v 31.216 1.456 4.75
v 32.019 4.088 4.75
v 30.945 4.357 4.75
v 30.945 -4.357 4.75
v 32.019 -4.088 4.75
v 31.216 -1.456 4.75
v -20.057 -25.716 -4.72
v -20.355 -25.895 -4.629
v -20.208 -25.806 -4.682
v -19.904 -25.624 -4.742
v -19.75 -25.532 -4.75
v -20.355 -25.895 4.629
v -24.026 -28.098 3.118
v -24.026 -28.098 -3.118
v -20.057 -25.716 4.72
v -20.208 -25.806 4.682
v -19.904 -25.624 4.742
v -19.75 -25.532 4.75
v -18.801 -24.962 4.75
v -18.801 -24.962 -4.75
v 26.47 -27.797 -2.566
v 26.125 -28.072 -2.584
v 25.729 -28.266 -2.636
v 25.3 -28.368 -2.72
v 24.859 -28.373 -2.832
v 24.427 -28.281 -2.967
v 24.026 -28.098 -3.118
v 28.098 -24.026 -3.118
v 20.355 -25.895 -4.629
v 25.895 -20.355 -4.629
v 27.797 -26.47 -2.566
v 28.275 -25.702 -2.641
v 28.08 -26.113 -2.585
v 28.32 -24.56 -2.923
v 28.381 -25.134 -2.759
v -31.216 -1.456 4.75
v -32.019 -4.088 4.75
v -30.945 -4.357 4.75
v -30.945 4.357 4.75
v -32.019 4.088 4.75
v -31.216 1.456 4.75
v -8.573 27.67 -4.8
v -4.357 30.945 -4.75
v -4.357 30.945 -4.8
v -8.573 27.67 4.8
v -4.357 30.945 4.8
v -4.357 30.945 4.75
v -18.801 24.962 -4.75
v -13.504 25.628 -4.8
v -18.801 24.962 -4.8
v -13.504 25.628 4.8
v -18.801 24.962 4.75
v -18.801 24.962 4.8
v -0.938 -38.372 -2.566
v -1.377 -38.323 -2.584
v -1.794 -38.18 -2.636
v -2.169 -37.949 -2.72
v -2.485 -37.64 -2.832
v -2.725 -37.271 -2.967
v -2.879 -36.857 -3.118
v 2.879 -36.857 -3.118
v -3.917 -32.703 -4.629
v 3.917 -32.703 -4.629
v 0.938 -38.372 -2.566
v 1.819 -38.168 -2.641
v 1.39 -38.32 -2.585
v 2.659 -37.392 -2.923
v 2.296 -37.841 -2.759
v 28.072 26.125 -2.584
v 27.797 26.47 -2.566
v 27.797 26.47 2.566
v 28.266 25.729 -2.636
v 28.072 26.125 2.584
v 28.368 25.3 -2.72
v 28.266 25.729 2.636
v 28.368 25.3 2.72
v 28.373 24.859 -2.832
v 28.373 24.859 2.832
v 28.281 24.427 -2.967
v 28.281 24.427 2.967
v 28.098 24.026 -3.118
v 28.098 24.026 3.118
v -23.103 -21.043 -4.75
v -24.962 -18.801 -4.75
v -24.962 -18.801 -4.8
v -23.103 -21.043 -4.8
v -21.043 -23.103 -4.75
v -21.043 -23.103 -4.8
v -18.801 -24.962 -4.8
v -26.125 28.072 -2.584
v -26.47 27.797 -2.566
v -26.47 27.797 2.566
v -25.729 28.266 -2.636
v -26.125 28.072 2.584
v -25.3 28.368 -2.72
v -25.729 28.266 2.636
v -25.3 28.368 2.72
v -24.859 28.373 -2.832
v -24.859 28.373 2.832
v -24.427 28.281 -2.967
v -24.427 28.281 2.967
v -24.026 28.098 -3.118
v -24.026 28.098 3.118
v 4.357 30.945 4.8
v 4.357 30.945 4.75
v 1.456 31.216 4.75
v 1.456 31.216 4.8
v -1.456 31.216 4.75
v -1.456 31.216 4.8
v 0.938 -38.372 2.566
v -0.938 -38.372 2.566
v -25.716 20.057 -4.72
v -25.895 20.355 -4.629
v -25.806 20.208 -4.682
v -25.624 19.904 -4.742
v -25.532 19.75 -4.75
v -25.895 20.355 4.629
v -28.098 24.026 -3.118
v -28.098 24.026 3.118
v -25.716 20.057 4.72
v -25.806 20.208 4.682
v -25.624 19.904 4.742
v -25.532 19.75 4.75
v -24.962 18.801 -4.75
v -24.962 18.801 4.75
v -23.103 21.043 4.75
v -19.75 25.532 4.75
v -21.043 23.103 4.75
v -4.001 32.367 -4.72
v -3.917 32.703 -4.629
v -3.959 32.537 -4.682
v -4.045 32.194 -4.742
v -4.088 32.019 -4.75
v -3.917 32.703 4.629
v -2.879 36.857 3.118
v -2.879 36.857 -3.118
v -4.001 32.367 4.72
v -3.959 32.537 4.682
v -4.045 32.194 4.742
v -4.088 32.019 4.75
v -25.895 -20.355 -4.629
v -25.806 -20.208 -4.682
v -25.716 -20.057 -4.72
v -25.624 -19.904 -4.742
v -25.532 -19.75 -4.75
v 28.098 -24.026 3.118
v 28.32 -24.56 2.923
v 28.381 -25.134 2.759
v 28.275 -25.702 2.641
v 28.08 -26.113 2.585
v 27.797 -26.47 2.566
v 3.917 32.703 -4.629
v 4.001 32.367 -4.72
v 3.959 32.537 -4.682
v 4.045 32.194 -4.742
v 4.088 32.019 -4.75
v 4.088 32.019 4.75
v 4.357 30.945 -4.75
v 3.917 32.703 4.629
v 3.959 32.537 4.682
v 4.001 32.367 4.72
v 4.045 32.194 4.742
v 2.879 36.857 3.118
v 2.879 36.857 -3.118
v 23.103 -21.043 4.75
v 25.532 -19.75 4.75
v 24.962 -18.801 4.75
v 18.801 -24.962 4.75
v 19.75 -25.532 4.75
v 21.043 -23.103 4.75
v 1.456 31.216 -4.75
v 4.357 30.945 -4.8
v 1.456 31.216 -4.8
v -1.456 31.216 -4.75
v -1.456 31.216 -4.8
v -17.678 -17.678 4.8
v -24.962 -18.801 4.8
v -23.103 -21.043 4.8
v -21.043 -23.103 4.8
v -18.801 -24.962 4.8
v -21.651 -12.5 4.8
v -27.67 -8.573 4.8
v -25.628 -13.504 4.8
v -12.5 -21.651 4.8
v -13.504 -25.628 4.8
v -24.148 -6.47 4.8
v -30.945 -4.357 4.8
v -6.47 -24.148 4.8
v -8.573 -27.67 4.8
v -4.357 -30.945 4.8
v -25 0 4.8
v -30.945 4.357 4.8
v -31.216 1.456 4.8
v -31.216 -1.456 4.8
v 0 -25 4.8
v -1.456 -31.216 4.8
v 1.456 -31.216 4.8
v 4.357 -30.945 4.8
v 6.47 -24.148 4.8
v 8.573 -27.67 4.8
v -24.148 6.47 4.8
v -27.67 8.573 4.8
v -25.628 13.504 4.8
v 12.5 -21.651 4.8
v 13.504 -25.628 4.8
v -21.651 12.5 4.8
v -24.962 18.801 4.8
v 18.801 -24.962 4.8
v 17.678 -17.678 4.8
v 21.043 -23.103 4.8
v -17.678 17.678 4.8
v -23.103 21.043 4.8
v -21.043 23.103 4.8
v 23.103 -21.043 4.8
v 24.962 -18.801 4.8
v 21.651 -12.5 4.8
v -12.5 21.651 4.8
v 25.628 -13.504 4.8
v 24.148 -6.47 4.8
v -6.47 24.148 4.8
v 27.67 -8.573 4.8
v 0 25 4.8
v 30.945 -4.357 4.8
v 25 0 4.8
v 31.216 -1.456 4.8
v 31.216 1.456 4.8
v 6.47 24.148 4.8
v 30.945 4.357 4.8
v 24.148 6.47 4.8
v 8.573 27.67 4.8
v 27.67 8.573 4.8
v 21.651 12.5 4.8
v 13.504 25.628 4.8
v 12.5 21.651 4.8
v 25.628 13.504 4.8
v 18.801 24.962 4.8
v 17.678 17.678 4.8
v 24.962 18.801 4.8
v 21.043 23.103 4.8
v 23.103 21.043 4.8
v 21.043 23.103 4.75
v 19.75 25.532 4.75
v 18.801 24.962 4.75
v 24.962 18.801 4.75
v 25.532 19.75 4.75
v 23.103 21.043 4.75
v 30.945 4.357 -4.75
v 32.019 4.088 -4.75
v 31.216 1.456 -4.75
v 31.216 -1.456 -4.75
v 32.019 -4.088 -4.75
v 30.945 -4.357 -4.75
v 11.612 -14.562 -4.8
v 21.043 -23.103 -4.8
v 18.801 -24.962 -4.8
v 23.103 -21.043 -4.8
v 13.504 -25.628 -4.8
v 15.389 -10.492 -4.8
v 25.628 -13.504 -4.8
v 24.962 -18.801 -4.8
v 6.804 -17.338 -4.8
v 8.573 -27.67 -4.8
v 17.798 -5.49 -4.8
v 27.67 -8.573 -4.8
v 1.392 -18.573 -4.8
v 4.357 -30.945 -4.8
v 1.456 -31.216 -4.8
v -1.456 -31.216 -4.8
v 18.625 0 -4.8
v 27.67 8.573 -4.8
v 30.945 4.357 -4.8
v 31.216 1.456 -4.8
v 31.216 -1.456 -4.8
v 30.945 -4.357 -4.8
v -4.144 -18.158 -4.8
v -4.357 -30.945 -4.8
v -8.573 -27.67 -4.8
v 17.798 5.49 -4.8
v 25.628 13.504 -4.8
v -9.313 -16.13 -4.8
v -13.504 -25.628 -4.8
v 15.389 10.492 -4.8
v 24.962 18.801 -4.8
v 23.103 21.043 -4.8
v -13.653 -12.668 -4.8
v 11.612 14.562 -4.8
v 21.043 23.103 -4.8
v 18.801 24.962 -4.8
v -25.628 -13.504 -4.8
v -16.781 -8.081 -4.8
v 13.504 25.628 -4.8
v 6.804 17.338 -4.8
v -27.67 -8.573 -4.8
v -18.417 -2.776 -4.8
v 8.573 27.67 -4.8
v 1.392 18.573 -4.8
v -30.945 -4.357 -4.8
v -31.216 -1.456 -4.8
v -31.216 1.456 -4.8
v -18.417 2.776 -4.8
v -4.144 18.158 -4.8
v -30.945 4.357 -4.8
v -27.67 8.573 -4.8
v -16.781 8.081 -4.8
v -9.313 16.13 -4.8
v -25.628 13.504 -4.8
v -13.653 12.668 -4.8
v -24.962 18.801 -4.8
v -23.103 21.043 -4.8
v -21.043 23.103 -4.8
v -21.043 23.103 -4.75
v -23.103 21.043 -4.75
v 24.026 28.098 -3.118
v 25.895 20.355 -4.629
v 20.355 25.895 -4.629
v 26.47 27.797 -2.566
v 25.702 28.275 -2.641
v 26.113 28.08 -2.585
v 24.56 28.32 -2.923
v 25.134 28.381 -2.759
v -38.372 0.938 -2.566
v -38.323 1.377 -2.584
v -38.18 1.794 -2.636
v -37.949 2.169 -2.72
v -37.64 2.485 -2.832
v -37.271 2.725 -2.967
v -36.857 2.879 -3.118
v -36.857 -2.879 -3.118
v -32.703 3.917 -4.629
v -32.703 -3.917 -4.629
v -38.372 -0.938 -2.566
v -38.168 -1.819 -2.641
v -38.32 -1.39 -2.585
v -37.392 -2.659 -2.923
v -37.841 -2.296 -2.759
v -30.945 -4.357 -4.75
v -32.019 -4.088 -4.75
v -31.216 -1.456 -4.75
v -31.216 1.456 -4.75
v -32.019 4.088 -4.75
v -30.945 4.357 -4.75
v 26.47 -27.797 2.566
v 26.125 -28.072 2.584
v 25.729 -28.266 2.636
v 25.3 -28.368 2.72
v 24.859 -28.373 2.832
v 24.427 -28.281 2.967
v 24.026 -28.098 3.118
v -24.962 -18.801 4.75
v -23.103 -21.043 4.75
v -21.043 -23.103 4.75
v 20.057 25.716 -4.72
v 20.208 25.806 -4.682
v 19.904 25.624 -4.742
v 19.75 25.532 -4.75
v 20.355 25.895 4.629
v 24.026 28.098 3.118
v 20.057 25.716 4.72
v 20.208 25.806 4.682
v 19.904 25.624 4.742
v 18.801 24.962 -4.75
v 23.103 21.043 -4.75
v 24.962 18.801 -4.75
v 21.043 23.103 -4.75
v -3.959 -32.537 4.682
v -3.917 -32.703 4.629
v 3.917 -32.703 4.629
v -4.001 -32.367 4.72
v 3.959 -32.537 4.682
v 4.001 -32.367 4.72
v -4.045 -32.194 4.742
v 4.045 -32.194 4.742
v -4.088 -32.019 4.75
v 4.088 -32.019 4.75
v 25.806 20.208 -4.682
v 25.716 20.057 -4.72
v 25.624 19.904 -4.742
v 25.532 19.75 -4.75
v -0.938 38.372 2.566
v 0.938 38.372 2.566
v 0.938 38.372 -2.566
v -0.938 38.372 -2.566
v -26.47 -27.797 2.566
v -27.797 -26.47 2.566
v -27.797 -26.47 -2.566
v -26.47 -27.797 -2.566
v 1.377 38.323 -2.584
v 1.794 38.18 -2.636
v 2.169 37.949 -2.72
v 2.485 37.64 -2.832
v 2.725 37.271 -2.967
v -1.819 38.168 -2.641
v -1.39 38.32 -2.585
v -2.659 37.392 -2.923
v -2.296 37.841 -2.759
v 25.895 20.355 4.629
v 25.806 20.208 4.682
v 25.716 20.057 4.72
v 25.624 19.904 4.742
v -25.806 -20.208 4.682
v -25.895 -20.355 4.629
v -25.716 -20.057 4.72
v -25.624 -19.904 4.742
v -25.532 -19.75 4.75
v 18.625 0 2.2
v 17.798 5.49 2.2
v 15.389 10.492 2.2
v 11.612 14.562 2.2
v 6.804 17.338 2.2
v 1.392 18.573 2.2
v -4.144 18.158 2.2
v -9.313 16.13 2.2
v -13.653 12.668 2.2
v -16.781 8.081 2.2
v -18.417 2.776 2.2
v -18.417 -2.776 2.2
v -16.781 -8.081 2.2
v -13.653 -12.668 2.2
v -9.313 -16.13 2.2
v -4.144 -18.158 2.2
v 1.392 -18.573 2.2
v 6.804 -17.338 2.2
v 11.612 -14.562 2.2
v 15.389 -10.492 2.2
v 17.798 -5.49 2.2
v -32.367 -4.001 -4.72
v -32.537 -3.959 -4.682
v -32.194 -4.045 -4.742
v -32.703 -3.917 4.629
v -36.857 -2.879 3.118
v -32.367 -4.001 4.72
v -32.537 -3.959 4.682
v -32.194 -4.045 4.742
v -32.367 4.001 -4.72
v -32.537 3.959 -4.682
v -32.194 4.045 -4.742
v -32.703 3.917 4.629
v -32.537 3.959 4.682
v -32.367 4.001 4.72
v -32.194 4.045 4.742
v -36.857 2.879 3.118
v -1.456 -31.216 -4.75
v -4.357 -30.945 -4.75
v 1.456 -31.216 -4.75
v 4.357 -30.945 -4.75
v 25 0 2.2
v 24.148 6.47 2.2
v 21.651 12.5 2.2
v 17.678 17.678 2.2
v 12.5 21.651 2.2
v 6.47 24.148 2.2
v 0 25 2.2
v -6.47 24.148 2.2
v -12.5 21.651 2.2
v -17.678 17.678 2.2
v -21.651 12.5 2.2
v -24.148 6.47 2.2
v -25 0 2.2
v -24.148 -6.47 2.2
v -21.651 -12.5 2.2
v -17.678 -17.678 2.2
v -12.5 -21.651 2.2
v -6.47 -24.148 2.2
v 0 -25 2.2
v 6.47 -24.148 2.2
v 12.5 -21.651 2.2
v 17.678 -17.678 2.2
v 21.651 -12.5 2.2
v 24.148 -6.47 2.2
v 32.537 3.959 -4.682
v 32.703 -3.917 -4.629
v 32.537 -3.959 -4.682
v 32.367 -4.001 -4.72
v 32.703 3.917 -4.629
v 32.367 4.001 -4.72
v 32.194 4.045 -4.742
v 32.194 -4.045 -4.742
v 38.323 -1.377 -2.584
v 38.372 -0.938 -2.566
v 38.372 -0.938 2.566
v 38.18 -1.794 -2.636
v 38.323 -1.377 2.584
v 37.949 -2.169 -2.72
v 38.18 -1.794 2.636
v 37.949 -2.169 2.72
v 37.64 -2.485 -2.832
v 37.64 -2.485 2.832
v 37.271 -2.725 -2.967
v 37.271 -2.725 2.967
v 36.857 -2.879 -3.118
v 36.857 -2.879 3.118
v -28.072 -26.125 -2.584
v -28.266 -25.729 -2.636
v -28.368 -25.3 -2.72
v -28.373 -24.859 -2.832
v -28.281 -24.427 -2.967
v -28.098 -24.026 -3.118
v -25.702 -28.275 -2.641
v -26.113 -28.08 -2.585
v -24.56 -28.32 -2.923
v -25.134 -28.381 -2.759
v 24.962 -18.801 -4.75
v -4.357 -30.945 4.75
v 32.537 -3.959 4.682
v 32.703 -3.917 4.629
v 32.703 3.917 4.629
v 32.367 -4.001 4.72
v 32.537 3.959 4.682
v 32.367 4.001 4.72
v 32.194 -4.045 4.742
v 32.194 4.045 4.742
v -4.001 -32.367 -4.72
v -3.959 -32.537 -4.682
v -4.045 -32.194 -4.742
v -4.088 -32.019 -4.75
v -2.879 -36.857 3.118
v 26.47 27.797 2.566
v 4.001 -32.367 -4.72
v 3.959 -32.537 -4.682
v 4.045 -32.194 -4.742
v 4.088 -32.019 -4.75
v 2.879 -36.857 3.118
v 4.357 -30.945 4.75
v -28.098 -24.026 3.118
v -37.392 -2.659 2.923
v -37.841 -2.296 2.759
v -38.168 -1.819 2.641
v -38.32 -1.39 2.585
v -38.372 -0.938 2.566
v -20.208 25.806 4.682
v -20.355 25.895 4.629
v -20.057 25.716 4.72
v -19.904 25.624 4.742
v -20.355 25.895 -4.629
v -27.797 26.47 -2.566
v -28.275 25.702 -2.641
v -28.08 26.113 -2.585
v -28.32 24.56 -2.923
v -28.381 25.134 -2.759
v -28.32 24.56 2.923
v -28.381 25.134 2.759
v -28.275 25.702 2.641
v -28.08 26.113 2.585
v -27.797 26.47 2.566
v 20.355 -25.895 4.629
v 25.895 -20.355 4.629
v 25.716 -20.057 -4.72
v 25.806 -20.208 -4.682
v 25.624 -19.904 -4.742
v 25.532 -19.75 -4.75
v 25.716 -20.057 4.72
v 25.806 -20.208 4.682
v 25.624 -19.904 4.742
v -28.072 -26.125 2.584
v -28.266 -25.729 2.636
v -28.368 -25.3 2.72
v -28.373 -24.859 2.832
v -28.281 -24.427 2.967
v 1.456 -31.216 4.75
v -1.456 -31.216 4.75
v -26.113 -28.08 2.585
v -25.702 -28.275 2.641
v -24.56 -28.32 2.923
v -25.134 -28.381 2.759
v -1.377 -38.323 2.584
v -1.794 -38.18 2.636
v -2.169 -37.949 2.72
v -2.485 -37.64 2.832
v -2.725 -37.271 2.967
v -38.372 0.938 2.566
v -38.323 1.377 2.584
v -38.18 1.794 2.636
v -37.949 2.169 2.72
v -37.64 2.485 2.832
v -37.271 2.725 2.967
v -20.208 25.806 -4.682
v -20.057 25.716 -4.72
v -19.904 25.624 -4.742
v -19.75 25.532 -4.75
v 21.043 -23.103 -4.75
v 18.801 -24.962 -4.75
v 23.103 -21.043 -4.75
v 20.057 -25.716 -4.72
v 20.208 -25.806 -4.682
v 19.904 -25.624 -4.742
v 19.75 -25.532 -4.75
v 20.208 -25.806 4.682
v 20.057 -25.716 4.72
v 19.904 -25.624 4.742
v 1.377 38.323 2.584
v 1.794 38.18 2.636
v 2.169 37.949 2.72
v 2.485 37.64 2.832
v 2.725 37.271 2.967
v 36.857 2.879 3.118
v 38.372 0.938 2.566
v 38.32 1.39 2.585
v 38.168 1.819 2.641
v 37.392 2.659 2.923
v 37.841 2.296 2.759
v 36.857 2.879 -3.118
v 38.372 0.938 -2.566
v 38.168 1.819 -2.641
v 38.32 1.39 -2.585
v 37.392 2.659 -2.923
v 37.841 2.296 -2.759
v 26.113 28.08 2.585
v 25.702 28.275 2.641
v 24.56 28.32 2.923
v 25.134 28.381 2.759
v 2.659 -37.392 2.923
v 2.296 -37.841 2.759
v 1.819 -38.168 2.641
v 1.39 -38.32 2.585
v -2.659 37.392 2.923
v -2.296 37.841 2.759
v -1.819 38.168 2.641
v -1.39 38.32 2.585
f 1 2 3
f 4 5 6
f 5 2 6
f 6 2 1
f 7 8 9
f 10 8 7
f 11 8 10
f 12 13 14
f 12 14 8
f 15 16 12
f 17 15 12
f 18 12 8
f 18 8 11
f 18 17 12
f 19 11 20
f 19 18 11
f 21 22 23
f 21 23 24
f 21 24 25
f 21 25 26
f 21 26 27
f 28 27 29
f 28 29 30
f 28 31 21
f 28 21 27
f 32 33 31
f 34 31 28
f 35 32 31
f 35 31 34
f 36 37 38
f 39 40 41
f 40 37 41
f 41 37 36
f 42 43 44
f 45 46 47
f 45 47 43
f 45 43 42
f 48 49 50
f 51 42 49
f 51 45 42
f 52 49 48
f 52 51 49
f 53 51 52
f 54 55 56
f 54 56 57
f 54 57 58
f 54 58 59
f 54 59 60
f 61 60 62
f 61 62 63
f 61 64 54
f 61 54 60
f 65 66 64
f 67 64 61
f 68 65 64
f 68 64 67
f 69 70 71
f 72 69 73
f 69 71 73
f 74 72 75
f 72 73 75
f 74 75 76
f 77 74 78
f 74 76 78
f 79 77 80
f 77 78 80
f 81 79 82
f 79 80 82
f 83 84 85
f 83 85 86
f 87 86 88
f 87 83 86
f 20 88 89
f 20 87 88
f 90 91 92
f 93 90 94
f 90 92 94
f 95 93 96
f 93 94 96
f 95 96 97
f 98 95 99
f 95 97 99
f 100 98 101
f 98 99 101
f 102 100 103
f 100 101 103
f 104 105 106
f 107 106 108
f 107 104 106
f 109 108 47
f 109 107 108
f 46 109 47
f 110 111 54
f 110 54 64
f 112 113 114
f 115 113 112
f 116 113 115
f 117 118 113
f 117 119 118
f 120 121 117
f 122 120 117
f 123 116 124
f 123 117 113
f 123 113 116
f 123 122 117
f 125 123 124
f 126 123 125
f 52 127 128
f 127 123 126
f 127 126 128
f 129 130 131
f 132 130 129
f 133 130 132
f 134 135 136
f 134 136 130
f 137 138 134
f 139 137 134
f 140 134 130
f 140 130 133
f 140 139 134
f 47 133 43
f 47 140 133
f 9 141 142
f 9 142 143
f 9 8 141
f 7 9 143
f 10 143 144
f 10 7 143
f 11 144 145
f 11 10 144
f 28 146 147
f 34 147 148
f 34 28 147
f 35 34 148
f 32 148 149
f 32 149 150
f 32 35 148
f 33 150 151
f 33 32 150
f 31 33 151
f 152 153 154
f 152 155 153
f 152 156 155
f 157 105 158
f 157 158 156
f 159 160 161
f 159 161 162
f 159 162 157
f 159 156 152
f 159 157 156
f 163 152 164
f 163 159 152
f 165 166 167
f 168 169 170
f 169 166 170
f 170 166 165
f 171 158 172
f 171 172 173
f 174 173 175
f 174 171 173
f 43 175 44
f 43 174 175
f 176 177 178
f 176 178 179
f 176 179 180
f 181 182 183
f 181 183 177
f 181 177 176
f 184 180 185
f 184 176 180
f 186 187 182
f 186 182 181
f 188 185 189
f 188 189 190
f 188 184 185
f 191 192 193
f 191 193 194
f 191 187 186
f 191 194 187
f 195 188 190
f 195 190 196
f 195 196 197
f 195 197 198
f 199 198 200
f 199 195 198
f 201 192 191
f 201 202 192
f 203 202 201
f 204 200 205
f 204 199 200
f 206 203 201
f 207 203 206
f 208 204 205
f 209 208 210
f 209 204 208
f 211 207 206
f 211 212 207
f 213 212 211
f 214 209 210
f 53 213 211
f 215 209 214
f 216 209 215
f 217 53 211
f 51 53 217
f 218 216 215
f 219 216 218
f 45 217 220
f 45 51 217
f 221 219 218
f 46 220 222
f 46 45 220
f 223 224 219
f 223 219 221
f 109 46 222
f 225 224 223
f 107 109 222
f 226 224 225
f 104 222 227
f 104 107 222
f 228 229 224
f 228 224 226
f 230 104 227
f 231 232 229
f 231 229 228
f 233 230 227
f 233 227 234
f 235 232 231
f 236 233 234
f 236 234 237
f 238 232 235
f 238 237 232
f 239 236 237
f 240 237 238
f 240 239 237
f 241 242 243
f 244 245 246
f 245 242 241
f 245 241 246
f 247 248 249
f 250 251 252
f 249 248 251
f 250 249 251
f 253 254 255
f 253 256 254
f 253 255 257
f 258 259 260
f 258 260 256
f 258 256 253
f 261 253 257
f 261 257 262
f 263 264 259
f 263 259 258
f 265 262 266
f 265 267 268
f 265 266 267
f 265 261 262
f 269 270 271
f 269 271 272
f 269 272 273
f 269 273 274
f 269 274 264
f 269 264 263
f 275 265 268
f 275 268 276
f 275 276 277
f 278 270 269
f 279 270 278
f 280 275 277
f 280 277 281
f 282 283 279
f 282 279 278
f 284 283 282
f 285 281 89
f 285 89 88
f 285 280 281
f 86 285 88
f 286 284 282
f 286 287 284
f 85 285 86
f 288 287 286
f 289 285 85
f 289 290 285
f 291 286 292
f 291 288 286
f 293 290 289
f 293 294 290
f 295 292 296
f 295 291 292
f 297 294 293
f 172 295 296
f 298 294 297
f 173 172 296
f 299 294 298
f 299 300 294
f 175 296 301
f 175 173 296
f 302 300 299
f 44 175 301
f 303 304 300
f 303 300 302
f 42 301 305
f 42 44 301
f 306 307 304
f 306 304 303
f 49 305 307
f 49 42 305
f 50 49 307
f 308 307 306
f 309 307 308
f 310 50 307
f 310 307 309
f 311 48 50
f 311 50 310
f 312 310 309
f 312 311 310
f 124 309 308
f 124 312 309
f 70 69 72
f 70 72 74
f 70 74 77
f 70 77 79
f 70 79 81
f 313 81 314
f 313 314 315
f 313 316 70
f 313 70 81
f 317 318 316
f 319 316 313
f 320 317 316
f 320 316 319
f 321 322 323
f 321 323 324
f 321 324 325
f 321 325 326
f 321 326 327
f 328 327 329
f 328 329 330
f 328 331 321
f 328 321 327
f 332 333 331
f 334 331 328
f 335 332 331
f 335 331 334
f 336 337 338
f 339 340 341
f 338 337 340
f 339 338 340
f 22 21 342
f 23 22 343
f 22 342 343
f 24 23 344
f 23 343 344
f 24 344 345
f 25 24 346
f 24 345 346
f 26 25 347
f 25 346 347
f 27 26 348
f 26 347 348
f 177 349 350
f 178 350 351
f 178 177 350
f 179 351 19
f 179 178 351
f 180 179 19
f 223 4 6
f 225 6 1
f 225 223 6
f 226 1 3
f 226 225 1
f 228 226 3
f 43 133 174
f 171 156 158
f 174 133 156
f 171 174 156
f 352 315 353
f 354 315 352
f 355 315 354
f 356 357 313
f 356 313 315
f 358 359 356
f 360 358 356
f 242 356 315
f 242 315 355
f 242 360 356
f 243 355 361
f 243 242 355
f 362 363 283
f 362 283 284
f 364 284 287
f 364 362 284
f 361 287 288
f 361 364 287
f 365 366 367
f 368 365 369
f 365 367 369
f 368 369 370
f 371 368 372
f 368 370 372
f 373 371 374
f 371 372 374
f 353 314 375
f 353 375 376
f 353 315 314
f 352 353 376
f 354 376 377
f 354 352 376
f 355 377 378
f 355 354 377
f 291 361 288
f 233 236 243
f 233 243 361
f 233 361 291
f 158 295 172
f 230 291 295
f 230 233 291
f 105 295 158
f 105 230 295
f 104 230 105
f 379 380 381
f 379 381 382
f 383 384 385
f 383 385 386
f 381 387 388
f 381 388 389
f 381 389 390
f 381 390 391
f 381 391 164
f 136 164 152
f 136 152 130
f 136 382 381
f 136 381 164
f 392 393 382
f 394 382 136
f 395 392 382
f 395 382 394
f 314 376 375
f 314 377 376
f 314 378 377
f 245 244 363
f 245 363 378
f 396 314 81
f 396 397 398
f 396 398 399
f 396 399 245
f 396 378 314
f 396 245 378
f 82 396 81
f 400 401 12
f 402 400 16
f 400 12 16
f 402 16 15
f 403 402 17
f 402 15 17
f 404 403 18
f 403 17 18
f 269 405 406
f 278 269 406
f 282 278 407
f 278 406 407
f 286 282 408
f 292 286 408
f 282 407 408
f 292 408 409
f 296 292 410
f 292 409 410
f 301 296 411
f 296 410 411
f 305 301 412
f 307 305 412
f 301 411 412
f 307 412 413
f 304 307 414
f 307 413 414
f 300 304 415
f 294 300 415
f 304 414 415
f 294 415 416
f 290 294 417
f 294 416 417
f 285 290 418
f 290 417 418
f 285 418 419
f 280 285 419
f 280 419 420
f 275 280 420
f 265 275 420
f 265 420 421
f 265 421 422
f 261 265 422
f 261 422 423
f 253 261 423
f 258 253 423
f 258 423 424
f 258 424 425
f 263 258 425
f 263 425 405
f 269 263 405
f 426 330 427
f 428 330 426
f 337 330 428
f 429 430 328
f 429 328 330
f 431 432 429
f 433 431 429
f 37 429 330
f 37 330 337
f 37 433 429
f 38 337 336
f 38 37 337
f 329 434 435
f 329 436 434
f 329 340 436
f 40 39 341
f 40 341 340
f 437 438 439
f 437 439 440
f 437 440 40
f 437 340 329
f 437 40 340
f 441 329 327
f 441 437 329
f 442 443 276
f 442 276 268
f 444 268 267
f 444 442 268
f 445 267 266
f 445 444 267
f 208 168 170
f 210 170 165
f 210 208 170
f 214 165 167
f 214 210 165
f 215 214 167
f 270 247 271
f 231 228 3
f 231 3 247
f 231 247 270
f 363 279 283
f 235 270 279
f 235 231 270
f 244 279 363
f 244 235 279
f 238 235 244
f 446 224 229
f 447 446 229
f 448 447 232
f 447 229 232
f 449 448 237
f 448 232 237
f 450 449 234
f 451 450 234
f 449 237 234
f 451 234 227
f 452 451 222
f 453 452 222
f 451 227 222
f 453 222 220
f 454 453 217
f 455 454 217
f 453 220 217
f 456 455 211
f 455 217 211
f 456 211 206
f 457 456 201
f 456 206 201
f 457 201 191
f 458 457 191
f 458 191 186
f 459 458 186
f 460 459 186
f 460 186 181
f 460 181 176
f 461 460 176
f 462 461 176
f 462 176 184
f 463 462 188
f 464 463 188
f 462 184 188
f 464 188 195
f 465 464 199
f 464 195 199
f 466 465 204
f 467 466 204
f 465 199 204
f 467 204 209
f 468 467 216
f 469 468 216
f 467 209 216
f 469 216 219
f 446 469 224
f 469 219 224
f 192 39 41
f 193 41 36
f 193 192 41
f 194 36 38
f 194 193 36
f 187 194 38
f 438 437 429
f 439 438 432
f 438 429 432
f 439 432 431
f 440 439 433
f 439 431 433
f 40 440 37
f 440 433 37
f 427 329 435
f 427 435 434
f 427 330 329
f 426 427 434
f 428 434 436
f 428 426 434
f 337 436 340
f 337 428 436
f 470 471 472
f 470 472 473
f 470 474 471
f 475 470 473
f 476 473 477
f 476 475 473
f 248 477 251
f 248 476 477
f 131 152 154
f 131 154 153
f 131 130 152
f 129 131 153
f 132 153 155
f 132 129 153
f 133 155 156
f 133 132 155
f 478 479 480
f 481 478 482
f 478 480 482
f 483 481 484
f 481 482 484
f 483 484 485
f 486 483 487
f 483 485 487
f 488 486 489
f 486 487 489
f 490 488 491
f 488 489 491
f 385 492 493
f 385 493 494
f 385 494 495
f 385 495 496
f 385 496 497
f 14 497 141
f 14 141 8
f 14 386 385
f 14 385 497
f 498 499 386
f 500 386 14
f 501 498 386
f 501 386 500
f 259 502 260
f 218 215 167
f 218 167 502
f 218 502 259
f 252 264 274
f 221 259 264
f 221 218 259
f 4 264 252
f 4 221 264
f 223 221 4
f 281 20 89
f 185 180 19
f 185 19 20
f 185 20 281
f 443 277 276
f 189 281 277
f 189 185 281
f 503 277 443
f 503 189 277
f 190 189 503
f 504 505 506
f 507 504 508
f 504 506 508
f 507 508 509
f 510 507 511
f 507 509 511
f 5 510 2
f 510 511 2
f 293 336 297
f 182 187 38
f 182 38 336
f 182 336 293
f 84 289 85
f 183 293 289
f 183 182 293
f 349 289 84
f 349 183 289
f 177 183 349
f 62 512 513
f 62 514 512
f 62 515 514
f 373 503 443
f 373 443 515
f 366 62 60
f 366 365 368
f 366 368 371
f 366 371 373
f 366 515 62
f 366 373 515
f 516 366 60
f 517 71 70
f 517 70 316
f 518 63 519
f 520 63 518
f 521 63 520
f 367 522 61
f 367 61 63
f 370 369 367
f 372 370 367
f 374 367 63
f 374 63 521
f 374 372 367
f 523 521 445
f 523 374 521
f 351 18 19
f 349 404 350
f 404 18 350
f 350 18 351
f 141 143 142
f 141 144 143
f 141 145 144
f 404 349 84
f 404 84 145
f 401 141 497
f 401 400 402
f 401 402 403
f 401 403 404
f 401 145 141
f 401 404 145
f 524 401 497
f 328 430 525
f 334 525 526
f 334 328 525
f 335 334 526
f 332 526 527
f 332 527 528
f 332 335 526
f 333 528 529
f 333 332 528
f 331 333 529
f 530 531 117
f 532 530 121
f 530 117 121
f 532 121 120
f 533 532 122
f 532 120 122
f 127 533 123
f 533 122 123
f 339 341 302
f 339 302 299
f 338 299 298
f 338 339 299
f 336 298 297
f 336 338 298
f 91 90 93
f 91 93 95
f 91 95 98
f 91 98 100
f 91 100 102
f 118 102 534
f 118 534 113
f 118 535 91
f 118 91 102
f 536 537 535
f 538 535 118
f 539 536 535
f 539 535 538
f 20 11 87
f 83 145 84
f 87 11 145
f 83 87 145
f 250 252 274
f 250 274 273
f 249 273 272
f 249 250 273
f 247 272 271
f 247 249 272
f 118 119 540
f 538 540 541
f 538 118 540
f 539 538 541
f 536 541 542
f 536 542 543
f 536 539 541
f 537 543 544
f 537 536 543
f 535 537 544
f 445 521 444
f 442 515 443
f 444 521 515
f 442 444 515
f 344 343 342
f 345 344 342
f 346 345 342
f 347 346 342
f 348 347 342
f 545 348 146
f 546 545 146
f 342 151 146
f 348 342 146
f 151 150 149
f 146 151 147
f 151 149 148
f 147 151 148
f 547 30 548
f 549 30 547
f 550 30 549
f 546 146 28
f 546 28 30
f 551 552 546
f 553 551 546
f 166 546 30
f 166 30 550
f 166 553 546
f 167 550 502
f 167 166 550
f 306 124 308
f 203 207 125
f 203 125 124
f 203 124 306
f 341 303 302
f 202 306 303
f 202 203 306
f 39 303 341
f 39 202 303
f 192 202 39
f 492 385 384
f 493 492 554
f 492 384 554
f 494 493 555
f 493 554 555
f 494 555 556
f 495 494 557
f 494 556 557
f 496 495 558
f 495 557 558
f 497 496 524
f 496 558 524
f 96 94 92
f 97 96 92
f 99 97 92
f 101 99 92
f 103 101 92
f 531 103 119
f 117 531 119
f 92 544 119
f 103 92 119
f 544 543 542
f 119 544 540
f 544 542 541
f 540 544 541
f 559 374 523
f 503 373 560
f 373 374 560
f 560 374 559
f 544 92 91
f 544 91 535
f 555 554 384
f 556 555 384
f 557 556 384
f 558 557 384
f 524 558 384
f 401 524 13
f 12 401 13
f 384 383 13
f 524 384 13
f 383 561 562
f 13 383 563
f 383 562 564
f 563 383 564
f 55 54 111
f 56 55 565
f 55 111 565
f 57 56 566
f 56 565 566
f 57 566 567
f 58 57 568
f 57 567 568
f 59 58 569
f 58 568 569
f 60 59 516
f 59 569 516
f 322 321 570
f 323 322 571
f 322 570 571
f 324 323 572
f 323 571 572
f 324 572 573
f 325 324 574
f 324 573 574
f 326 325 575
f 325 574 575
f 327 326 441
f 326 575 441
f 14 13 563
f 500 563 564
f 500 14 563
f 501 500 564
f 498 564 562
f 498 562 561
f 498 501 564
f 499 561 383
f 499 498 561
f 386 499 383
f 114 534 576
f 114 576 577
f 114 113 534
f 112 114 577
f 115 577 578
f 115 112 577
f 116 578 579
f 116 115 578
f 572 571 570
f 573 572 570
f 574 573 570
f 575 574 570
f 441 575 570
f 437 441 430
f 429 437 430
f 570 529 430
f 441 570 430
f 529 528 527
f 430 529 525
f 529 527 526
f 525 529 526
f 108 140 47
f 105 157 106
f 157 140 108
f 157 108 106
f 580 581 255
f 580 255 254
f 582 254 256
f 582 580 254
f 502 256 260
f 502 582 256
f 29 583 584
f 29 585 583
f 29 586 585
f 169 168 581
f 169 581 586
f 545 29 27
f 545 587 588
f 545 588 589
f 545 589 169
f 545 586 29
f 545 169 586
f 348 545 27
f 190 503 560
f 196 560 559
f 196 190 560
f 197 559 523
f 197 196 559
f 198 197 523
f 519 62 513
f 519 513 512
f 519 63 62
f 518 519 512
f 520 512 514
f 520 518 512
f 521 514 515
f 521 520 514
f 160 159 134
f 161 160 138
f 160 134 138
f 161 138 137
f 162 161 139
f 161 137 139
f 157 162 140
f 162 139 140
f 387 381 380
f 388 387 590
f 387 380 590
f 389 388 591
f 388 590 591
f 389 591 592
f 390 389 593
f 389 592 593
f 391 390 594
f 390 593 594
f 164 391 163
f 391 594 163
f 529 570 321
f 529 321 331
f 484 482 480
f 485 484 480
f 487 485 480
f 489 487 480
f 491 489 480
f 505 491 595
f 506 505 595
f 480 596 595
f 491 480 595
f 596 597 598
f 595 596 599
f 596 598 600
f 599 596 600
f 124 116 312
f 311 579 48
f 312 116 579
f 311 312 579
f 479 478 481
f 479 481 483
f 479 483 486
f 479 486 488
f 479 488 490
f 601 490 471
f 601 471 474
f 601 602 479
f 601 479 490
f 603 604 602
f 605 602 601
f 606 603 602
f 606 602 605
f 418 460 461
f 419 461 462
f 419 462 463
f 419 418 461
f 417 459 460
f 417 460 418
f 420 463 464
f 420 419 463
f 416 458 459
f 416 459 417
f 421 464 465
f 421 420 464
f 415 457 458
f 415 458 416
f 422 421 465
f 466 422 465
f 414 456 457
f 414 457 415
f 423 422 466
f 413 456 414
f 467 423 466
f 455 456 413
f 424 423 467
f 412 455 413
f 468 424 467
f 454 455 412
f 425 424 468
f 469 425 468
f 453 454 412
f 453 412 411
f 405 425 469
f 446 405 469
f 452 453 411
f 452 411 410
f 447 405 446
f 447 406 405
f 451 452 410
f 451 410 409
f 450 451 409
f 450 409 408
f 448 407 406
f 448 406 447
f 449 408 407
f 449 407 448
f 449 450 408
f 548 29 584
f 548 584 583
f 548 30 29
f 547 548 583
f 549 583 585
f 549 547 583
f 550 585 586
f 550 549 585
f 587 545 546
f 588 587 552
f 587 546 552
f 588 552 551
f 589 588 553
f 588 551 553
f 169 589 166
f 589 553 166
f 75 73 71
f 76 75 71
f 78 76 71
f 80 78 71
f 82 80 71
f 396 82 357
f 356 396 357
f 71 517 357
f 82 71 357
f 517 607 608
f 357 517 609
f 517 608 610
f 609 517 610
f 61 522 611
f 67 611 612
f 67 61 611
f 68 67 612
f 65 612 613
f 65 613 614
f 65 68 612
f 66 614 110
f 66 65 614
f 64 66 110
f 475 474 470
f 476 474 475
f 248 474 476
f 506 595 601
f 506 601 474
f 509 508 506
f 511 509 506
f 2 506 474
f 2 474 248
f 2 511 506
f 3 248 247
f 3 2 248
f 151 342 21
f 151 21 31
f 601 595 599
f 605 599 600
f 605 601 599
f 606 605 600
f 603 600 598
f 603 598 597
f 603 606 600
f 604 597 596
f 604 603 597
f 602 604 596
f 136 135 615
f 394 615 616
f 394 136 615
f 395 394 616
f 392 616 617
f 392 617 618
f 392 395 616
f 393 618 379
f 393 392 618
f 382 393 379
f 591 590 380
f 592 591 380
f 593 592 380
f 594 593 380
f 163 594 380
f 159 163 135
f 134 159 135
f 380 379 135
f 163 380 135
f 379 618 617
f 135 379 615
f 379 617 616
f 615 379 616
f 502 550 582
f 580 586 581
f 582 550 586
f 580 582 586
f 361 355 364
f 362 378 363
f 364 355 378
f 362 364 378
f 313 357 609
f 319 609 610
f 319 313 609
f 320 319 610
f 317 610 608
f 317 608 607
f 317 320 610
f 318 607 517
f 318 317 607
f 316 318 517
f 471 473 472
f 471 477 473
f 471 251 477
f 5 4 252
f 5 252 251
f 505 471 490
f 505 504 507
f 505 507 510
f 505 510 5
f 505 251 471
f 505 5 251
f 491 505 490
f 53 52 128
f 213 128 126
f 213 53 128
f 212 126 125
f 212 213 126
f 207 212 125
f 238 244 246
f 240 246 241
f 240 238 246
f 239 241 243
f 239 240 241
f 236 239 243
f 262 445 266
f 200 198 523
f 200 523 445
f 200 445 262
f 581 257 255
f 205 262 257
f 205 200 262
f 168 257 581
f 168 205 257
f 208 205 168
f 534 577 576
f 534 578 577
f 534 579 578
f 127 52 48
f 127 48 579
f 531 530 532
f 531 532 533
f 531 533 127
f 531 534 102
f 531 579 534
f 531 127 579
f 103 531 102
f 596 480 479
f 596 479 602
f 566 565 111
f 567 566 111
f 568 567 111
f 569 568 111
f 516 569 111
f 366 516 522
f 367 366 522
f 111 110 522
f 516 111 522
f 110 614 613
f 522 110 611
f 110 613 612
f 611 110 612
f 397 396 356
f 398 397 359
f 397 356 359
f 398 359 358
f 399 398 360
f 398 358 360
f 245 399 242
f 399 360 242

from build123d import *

# Parameters (mm, degrees)
SKETCH1_R           = 31.25
BOSS_EXTRUDE1_DEPTH = 15
BOSS_EXTRUDE2_DEPTH = 4.75
CHAMFER1_SIZE       = 6
CHAMFER1_SIZE2      = 2.183821406
CHAMFER2_SIZE       = 6
CHAMFER2_SIZE2      = 2.183821406
FILLET11_R          = 2
FILLET12_R          = 2
CIRPATTERN1_COUNT   = 8
SKETCH14_W          = 114.781544729
SKETCH14_H          = 99.982125168
CUT_EXTRUDE11_DEPTH = 20
SKETCH15_W          = 194.409122682
SKETCH15_H          = 129.478767366
CUT_EXTRUDE12_DEPTH = 20
CUT_EXTRUDE13_DEPTH = 20
CIRPATTERN3_COUNT   = 8
SKETCH20_R          = 18.625
CUT_EXTRUDE14_DEPTH = 20
SKETCH21_R          = 25
CUT_EXTRUDE15_DEPTH = 2.6


with BuildPart() as part:
    # Sketch1 → Boss-Extrude1 (new body, symmetric)
    with BuildSketch(Plane.XY):
        Circle(SKETCH1_R)
    extrude(amount=BOSS_EXTRUDE1_DEPTH, both=True)

    # Sketch2 → Boss-Extrude2 (add, symmetric)
    with BuildSketch(Plane.XY):
        Polygon((-28.372098708, -5), (-28.372098708, 5), (-38.372098708, 2.5), (-38.372098708, -2.5), align=None)
    extrude(amount=BOSS_EXTRUDE2_DEPTH, both=True)

    # Chamfer1
    chamfer1_edges = [part.edges().sort_by_distance(p)[0] for p in [
        (-38.372098708, 0, -4.75),
    ]]
    chamfer1_side = [part.faces().sort_by_distance(p)[0] for p in [
        (-34.440800156, 0, -4.75),
    ]]
    chamfer(chamfer1_edges, length=CHAMFER1_SIZE, length2=CHAMFER1_SIZE2, reference=chamfer1_side[0])

    # Chamfer2
    chamfer2_edges = [part.edges().sort_by_distance(p)[0] for p in [
        (-38.372098708, 0, 4.75),
    ]]
    chamfer2_side = [part.faces().sort_by_distance(p)[0] for p in [
        (-34.440800156, 0, 4.75),
    ]]
    chamfer(chamfer2_edges, length=CHAMFER2_SIZE, length2=CHAMFER2_SIZE2, reference=chamfer2_side[0])

    # Fillet11
    fillet11_edges = [part.edges().sort_by_distance(p)[0] for p in [
        (-38.372098708, -2.5, 0),
        (-38.372098708, 2.5, 0),
    ]]
    fillet(fillet11_edges, radius=FILLET11_R)

    # Fillet12
    fillet12_edges = [part.edges().sort_by_distance(p)[0] for p in [
        (-32.372098708, 0, -4.75),
        (-32.372098708, 0, 4.75),
    ]]
    fillet(fillet12_edges, radius=FILLET12_R)

    # CirPattern1: part ×8 about axis
    cirpattern1_axis = Axis((0, 0, 0), (0, 0, 1))


with BuildPart() as part_1:
    add(part.part)
    for i in range(1, CIRPATTERN1_COUNT):
        add(part.part.rotate(cirpattern1_axis, i * 360 / CIRPATTERN1_COUNT))

    # Sketch14 → Cut-Extrude11 (cut)
    with BuildSketch(Plane(origin=(0, 0, -4.8), x_dir=(-1, 0, 0), z_dir=(0, 0, -1))):
        with Locations((10.903993862, -9.833989058)):
            Rectangle(SKETCH14_W, SKETCH14_H)
    extrude(amount=CUT_EXTRUDE11_DEPTH, mode=Mode.SUBTRACT)

    # Sketch15 → Cut-Extrude12 (cut)
    with BuildSketch(Plane.XY.offset(4.8)):
        with Locations((1.322307029, -4.255701029)):
            Rectangle(SKETCH15_W, SKETCH15_H)
    extrude(amount=CUT_EXTRUDE12_DEPTH, mode=Mode.SUBTRACT)

    # Sketch17 → Cut-Extrude13 (cut)
    with BuildSketch(Plane.XY.offset(4.8)):
        with BuildLine():
            Line((-3.917153419, 32.703485033), (-4.356824963, 30.944798856))
            ThreePointArc((-4.356824963, 30.944798856), (-10.969884461, 26.483643844), (-18.800536638, 24.962017589))
            Line((-18.800536638, 24.962017589), (-20.35501029, 25.89470178))
            Line((-20.35501029, 25.89470178), (-3.917153419, 32.703485033))
        make_face()
    cut_extrude13 = extrude(amount=-CUT_EXTRUDE13_DEPTH, mode=Mode.SUBTRACT)

    # CirPattern3: Cut-Extrude13 ×8 about axis
    cirpattern3_axis = Axis((0, 0, 0), (0, 0, 1))
    for i in range(1, CIRPATTERN3_COUNT):
        add(cut_extrude13.rotate(cirpattern3_axis, i * 360 / CIRPATTERN3_COUNT), mode=Mode.SUBTRACT)

    # Sketch20 → Cut-Extrude14 (cut)
    with BuildSketch(Plane.XY.offset(4.8)):
        Circle(SKETCH20_R)
    extrude(amount=-CUT_EXTRUDE14_DEPTH, mode=Mode.SUBTRACT)

    # Sketch21 → Cut-Extrude15 (cut)
    with BuildSketch(Plane.XY.offset(4.8)):
        Circle(SKETCH21_R)
    extrude(amount=-CUT_EXTRUDE15_DEPTH, mode=Mode.SUBTRACT)


solid = part_1.part
